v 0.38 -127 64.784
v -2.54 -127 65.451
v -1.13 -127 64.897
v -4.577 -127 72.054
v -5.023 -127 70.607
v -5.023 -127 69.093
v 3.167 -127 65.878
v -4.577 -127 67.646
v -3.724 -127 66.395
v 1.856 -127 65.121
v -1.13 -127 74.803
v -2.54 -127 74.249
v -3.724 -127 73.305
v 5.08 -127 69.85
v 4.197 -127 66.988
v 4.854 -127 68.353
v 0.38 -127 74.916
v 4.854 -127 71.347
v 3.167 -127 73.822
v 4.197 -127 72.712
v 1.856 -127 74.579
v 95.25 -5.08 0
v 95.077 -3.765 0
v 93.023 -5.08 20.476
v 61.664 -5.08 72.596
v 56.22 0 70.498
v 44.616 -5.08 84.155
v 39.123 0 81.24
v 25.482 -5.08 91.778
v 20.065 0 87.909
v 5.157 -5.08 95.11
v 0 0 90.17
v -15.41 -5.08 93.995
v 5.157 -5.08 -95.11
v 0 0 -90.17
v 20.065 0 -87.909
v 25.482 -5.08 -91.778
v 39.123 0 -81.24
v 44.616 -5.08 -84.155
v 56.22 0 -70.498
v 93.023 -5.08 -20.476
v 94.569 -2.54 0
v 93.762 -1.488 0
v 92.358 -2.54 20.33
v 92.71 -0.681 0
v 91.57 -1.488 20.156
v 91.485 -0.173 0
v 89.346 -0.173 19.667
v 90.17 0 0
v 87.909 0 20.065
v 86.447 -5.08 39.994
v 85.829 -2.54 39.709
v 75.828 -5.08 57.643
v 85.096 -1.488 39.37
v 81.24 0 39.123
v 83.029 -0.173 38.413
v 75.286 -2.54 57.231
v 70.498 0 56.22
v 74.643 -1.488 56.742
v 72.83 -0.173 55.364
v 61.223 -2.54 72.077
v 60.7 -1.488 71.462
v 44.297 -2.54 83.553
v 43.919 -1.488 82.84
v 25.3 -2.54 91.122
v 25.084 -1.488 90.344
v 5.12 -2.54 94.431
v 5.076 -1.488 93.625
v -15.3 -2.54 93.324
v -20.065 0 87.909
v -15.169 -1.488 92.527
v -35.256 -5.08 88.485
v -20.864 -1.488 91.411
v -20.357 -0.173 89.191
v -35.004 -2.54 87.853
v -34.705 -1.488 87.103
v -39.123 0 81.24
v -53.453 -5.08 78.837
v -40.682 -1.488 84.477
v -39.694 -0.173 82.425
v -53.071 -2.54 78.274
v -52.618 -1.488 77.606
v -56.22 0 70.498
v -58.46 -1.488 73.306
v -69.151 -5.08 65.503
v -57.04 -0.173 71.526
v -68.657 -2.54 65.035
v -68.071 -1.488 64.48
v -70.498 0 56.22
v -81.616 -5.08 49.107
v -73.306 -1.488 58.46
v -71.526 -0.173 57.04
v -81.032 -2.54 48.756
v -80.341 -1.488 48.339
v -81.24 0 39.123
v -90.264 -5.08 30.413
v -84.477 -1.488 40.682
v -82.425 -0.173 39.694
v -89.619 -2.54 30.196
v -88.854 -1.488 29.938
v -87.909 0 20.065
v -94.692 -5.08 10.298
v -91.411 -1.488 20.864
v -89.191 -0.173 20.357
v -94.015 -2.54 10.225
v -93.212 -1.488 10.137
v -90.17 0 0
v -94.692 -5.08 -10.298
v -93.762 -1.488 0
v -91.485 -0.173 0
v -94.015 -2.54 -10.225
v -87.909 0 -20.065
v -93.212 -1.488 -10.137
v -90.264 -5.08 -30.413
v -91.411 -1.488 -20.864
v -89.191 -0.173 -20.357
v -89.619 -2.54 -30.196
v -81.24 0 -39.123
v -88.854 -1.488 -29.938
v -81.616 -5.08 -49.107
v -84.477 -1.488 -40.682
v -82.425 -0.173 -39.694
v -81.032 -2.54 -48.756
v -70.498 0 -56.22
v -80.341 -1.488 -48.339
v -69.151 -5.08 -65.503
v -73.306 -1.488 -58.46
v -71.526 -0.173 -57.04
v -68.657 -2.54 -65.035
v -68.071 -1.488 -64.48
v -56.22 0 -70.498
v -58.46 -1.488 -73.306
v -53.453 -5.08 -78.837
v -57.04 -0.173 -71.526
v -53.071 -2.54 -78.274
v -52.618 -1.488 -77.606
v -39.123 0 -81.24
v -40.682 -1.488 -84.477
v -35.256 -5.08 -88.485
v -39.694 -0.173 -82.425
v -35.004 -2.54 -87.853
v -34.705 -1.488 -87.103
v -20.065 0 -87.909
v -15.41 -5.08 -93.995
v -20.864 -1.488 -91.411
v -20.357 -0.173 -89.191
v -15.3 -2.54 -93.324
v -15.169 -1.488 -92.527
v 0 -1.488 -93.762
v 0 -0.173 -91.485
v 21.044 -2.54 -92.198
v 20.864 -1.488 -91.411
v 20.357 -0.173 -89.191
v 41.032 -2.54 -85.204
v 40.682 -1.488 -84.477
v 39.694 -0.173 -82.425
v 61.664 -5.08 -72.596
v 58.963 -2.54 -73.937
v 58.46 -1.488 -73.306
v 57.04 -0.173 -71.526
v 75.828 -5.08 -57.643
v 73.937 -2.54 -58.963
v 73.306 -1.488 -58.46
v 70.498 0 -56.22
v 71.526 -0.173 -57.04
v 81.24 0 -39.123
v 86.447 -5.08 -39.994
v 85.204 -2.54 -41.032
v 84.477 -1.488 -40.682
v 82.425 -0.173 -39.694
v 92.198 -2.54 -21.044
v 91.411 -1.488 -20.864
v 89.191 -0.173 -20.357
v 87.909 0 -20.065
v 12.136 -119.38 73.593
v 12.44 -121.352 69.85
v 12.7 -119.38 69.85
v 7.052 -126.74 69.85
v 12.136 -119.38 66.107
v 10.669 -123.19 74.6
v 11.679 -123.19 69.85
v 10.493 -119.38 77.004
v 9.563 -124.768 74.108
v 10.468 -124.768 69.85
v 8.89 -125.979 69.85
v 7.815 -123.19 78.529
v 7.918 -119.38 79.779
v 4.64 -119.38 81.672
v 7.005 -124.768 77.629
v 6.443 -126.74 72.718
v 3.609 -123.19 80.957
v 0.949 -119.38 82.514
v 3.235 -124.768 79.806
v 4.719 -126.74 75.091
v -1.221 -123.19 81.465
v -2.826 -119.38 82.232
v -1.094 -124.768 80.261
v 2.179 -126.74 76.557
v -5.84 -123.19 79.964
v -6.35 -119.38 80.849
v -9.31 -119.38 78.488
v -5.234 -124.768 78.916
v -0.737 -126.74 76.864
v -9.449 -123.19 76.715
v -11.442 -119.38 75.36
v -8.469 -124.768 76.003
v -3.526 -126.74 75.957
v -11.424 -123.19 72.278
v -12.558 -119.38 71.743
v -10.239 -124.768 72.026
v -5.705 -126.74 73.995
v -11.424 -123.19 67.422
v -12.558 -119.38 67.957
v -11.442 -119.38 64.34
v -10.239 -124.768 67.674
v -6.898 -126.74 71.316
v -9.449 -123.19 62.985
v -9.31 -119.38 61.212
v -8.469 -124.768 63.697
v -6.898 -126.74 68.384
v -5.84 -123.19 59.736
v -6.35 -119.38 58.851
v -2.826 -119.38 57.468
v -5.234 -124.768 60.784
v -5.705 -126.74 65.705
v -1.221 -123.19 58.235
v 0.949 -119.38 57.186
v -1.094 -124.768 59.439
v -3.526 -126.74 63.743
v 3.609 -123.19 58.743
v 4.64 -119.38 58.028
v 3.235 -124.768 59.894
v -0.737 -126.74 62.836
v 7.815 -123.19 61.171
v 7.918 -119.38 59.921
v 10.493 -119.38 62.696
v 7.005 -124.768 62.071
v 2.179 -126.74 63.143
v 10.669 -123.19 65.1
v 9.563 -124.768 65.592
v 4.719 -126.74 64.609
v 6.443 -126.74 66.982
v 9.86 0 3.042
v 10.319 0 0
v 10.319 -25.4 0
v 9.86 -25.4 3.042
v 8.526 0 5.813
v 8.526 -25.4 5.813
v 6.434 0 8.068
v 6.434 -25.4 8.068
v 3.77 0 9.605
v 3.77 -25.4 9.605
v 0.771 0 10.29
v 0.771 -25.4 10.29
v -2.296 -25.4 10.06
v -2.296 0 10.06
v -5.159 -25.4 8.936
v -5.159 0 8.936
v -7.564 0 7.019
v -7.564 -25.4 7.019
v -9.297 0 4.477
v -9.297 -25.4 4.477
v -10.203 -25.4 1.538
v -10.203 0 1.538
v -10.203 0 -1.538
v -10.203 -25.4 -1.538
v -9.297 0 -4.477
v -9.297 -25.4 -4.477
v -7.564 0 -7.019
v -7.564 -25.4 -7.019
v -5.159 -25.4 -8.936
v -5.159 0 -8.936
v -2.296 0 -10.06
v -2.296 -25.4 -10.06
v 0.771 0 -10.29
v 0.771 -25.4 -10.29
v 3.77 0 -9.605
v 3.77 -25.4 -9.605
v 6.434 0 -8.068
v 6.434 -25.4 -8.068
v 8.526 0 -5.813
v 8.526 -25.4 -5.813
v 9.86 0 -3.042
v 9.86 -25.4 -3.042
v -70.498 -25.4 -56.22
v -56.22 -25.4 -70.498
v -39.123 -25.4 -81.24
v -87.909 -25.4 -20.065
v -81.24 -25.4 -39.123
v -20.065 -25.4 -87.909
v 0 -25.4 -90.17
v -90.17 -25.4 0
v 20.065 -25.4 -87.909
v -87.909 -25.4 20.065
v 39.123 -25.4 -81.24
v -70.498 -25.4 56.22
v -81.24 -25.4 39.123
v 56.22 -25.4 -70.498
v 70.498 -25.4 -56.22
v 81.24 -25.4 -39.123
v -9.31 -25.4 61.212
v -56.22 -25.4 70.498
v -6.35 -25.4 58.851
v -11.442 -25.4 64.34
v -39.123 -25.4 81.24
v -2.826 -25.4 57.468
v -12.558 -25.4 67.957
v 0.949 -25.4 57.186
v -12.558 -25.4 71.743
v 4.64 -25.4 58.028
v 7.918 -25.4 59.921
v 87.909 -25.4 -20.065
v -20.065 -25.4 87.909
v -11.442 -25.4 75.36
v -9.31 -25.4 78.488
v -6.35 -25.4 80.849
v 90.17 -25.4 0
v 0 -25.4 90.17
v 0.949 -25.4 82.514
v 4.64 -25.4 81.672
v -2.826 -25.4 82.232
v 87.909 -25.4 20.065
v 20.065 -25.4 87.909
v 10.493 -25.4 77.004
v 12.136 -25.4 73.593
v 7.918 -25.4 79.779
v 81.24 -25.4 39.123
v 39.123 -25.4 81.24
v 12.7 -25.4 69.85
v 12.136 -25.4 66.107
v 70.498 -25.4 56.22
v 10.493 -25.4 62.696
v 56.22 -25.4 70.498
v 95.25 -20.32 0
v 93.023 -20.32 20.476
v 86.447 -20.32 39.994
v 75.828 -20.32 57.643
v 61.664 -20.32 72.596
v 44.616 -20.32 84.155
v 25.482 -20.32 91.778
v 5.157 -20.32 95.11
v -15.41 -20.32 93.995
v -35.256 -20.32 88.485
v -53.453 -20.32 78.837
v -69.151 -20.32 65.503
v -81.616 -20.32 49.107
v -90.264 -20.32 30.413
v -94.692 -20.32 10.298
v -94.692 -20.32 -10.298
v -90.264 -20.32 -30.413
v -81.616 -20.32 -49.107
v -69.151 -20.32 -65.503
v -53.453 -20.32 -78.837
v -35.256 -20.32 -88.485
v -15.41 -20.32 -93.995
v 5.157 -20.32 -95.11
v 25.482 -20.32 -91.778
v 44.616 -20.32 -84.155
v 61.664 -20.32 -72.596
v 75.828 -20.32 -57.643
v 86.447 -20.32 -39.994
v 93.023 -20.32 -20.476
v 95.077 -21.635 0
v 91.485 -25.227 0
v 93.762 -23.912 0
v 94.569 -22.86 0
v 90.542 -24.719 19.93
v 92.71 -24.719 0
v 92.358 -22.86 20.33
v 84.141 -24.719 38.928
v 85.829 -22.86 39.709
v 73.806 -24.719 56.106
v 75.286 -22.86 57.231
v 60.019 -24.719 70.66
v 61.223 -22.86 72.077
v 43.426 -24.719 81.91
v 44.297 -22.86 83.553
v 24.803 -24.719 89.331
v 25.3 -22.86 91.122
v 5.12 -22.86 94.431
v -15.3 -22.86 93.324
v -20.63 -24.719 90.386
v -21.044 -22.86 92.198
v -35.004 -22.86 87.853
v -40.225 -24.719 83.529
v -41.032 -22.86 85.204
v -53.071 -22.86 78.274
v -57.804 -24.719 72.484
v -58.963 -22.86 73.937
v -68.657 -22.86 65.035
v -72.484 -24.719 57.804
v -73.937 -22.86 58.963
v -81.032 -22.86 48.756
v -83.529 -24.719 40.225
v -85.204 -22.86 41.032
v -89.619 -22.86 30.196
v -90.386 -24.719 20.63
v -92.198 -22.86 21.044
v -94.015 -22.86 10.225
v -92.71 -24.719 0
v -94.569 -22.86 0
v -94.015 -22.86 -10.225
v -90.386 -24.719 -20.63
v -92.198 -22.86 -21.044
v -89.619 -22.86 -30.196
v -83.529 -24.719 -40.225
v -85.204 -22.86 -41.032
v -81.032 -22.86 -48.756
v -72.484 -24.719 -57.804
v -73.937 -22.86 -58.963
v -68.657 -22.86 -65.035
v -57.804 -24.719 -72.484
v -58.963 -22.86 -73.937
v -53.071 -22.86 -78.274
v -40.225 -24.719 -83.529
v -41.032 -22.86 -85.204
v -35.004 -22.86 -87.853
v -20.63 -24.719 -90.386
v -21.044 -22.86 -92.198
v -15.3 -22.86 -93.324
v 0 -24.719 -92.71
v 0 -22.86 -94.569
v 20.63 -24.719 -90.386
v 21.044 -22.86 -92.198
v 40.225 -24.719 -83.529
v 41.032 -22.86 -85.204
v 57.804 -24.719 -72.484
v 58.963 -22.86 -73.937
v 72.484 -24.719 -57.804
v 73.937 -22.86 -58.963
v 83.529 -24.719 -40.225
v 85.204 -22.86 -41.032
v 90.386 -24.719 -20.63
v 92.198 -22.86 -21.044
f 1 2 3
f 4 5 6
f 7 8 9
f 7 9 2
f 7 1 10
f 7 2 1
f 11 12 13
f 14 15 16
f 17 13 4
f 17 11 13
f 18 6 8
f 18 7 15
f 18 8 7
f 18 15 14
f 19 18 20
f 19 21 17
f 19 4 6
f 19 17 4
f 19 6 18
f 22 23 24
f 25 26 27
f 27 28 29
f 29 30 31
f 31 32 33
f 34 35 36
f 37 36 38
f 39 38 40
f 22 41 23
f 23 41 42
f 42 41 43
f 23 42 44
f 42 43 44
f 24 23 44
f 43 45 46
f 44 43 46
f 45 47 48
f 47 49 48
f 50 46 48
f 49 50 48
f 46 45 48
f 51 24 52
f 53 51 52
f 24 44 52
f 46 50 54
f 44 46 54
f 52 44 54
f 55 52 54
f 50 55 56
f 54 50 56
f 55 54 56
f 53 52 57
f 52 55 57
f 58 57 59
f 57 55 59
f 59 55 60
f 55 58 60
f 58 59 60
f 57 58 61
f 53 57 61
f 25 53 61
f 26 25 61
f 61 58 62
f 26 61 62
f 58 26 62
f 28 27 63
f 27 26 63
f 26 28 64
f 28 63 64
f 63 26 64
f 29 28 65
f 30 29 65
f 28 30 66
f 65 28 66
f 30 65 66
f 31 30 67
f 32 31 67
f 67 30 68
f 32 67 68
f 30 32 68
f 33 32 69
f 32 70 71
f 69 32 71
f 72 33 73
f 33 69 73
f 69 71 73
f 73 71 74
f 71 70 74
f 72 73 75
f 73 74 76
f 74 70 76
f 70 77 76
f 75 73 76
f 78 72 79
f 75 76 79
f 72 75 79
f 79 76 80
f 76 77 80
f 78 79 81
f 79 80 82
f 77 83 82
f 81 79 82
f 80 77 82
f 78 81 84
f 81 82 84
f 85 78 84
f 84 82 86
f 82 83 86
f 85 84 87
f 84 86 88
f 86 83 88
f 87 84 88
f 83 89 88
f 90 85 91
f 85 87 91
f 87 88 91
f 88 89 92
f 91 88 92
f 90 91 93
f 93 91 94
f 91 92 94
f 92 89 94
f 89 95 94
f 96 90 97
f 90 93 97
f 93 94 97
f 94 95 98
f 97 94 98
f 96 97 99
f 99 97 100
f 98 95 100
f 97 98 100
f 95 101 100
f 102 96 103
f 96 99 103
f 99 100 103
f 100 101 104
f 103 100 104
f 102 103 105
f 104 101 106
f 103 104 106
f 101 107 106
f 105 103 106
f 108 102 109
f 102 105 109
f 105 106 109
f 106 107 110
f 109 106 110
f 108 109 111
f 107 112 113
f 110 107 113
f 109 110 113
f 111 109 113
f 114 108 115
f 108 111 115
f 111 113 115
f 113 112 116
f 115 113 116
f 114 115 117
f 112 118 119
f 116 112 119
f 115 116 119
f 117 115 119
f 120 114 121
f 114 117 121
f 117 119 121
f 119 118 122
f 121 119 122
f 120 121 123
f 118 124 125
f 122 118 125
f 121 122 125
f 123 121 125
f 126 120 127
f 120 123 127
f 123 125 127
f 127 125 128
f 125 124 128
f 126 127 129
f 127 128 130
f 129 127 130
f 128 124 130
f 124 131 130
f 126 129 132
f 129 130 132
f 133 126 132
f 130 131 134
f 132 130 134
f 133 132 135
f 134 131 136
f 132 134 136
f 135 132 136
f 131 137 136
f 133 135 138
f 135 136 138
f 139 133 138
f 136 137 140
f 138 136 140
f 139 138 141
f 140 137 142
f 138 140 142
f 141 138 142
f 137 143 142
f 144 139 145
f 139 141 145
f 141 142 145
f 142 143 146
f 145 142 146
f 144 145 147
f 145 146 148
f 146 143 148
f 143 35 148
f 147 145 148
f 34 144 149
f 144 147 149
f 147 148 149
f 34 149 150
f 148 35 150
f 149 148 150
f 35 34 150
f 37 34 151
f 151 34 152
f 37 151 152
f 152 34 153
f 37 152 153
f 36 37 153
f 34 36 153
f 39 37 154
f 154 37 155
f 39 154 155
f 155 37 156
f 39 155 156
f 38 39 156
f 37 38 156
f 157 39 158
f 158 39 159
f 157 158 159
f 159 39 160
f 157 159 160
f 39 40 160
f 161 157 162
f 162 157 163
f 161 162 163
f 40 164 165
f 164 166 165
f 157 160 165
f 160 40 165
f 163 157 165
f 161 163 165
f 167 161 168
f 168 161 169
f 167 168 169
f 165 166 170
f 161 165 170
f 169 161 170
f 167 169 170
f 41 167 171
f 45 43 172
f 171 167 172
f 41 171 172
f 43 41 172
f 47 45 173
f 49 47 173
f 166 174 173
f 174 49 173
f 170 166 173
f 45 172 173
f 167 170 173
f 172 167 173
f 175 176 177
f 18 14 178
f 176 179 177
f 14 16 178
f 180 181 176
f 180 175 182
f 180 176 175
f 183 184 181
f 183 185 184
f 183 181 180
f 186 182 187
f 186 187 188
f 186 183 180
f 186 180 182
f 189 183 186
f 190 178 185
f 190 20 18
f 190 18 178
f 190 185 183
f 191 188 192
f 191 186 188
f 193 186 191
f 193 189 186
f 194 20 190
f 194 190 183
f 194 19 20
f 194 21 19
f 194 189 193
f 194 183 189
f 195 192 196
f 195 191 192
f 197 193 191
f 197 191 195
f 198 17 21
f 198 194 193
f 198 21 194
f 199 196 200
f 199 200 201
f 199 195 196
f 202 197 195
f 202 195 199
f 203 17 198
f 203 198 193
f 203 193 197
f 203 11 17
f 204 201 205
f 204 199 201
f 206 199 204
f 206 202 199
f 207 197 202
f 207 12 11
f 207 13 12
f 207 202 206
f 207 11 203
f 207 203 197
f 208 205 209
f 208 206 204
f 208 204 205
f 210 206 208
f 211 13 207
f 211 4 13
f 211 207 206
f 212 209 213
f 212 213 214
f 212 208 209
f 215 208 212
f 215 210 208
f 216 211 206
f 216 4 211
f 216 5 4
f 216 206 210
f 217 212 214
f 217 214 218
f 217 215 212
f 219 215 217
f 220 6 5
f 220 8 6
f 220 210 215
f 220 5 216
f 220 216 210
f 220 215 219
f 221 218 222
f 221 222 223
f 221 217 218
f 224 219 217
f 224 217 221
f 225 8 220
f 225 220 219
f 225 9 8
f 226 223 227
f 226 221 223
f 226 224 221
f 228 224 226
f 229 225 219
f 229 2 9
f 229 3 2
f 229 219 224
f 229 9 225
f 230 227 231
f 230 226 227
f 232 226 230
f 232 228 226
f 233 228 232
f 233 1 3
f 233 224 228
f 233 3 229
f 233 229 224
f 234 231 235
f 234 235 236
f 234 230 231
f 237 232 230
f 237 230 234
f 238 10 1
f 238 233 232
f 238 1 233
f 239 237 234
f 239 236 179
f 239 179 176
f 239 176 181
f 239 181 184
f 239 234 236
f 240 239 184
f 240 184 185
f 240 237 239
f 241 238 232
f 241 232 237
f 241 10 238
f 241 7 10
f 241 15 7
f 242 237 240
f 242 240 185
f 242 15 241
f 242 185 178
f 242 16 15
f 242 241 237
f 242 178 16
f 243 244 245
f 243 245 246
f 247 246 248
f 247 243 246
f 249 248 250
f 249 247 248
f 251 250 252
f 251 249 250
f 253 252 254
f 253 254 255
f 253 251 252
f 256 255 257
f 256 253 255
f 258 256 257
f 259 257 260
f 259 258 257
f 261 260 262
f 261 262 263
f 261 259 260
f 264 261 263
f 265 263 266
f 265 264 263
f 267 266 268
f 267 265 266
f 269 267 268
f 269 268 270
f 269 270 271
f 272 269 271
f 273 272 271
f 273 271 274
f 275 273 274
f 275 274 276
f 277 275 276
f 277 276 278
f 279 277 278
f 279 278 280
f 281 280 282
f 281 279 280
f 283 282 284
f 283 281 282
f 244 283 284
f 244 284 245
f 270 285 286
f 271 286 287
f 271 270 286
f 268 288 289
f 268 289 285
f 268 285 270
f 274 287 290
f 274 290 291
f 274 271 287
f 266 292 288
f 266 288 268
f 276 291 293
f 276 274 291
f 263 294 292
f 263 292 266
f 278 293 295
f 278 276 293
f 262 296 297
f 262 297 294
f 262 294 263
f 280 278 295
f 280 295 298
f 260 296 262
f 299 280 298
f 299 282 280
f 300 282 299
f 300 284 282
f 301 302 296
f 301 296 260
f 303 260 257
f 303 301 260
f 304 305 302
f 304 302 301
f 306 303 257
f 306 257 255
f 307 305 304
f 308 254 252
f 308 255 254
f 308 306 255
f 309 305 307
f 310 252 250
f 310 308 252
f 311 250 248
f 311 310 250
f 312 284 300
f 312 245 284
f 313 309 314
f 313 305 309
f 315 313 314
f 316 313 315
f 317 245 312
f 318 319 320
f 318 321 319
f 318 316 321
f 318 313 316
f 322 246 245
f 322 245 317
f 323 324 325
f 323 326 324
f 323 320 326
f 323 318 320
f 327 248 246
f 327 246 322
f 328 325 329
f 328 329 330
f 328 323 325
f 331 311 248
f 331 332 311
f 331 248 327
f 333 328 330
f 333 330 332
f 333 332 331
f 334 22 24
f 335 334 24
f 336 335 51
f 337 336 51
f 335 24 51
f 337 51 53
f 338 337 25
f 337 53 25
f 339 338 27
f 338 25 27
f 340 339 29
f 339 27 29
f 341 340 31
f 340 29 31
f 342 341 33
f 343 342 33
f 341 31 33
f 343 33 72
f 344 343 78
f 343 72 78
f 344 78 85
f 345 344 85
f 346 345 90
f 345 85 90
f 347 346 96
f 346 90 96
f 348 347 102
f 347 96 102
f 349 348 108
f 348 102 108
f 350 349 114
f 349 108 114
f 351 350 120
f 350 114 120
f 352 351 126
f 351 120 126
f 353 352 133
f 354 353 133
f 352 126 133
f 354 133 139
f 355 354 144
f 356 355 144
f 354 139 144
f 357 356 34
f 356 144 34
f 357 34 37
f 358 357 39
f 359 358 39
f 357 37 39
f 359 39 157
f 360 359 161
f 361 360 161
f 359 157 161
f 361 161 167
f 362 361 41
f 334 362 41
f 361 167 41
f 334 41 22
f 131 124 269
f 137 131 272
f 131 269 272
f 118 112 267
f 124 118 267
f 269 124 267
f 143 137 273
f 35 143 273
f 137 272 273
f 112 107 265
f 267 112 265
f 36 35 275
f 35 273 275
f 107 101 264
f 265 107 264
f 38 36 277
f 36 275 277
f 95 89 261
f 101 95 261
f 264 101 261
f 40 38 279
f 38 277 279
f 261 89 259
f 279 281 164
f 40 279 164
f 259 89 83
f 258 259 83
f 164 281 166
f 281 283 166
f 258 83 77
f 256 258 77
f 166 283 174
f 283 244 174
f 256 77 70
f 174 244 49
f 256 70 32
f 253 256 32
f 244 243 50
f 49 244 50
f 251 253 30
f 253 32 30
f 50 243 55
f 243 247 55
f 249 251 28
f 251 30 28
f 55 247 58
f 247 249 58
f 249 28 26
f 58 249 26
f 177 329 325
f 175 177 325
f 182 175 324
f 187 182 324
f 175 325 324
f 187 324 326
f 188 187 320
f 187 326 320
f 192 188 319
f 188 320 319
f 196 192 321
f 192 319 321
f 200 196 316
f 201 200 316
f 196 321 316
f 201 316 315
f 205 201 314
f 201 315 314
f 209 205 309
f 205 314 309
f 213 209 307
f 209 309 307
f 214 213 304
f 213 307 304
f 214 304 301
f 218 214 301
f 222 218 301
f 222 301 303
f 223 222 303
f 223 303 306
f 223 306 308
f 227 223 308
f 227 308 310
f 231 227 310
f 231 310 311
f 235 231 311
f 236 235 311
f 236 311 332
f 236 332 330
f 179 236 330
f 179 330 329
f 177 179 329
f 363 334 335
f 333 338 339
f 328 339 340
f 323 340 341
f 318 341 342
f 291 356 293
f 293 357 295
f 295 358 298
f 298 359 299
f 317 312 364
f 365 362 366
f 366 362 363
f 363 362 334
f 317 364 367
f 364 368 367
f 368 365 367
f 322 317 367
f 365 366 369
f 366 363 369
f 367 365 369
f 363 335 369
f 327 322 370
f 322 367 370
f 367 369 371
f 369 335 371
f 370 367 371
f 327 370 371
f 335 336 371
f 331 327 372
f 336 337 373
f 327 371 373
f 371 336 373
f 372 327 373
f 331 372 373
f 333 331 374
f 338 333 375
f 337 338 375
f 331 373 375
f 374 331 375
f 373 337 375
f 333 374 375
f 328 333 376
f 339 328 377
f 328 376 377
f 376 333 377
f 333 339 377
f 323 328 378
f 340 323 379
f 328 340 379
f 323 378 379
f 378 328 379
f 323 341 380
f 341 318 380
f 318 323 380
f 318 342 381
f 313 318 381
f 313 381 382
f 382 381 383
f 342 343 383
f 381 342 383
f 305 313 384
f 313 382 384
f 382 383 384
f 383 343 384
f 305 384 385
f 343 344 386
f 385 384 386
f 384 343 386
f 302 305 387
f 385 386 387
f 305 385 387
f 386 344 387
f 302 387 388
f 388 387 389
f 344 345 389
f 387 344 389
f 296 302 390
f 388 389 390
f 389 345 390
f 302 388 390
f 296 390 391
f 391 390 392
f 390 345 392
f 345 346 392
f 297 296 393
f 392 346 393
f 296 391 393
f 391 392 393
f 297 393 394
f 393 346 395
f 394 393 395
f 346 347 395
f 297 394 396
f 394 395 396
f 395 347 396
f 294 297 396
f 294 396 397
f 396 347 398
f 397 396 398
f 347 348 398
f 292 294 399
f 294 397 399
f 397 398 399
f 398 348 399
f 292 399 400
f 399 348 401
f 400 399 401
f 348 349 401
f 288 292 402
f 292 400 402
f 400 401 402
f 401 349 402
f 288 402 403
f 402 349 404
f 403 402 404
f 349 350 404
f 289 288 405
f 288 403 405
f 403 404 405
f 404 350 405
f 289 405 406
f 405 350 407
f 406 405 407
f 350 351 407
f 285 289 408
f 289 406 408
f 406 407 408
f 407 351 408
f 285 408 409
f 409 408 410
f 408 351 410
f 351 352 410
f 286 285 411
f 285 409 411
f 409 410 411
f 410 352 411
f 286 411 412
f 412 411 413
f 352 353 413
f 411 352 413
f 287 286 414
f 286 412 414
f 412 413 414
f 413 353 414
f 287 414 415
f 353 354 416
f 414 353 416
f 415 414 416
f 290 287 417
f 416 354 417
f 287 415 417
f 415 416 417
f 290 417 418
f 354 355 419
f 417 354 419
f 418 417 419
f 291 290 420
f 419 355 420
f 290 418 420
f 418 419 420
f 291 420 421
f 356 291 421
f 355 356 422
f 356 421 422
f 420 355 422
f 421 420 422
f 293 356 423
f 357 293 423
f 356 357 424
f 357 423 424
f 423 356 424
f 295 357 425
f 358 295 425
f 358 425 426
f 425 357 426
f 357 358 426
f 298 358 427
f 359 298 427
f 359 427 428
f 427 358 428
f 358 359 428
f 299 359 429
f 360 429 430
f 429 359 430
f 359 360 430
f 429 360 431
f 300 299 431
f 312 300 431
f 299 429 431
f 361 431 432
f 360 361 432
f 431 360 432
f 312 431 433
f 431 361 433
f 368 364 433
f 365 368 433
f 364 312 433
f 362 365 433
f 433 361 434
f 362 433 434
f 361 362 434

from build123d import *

# Parameters (mm, degrees)
F0_R     = 95.25
F0_R_2   = 10.31875
F0_R_3   = 12.7
F1_DEPTH = 25.4
F2_DEPTH = 127
F3_R     = 5.08
F4_R     = 7.62


with BuildPart() as f1:
    # F0 (on Front) → F1 (new body)
    with BuildSketch(Plane.XZ):
        Circle(F0_R)
        Circle(F0_R_2, mode=Mode.SUBTRACT)
        with Locations((0, 69.85)):
            Circle(F0_R_3, mode=Mode.SUBTRACT)
    extrude(amount=F1_DEPTH)

    # F0 (on Front) → F2 (join)
    with BuildSketch(Plane.XZ):
        with Locations((0, 69.85)):
            Circle(F0_R_3)
    extrude(amount=F2_DEPTH)

    # F3
    f3_edges = [f1.edges().sort_by_distance(p)[0] for p in [
        (-95.25, -25.4, 0),
        (-95.25, 0, 0),
    ]]
    fillet(f3_edges, radius=F3_R)

    # F4
    f4_edges = [f1.edges().sort_by_distance(p)[0] for p in [
        (-12.7, -127, 69.85),
    ]]
    fillet(f4_edges, radius=F4_R)


solid = f1.part
